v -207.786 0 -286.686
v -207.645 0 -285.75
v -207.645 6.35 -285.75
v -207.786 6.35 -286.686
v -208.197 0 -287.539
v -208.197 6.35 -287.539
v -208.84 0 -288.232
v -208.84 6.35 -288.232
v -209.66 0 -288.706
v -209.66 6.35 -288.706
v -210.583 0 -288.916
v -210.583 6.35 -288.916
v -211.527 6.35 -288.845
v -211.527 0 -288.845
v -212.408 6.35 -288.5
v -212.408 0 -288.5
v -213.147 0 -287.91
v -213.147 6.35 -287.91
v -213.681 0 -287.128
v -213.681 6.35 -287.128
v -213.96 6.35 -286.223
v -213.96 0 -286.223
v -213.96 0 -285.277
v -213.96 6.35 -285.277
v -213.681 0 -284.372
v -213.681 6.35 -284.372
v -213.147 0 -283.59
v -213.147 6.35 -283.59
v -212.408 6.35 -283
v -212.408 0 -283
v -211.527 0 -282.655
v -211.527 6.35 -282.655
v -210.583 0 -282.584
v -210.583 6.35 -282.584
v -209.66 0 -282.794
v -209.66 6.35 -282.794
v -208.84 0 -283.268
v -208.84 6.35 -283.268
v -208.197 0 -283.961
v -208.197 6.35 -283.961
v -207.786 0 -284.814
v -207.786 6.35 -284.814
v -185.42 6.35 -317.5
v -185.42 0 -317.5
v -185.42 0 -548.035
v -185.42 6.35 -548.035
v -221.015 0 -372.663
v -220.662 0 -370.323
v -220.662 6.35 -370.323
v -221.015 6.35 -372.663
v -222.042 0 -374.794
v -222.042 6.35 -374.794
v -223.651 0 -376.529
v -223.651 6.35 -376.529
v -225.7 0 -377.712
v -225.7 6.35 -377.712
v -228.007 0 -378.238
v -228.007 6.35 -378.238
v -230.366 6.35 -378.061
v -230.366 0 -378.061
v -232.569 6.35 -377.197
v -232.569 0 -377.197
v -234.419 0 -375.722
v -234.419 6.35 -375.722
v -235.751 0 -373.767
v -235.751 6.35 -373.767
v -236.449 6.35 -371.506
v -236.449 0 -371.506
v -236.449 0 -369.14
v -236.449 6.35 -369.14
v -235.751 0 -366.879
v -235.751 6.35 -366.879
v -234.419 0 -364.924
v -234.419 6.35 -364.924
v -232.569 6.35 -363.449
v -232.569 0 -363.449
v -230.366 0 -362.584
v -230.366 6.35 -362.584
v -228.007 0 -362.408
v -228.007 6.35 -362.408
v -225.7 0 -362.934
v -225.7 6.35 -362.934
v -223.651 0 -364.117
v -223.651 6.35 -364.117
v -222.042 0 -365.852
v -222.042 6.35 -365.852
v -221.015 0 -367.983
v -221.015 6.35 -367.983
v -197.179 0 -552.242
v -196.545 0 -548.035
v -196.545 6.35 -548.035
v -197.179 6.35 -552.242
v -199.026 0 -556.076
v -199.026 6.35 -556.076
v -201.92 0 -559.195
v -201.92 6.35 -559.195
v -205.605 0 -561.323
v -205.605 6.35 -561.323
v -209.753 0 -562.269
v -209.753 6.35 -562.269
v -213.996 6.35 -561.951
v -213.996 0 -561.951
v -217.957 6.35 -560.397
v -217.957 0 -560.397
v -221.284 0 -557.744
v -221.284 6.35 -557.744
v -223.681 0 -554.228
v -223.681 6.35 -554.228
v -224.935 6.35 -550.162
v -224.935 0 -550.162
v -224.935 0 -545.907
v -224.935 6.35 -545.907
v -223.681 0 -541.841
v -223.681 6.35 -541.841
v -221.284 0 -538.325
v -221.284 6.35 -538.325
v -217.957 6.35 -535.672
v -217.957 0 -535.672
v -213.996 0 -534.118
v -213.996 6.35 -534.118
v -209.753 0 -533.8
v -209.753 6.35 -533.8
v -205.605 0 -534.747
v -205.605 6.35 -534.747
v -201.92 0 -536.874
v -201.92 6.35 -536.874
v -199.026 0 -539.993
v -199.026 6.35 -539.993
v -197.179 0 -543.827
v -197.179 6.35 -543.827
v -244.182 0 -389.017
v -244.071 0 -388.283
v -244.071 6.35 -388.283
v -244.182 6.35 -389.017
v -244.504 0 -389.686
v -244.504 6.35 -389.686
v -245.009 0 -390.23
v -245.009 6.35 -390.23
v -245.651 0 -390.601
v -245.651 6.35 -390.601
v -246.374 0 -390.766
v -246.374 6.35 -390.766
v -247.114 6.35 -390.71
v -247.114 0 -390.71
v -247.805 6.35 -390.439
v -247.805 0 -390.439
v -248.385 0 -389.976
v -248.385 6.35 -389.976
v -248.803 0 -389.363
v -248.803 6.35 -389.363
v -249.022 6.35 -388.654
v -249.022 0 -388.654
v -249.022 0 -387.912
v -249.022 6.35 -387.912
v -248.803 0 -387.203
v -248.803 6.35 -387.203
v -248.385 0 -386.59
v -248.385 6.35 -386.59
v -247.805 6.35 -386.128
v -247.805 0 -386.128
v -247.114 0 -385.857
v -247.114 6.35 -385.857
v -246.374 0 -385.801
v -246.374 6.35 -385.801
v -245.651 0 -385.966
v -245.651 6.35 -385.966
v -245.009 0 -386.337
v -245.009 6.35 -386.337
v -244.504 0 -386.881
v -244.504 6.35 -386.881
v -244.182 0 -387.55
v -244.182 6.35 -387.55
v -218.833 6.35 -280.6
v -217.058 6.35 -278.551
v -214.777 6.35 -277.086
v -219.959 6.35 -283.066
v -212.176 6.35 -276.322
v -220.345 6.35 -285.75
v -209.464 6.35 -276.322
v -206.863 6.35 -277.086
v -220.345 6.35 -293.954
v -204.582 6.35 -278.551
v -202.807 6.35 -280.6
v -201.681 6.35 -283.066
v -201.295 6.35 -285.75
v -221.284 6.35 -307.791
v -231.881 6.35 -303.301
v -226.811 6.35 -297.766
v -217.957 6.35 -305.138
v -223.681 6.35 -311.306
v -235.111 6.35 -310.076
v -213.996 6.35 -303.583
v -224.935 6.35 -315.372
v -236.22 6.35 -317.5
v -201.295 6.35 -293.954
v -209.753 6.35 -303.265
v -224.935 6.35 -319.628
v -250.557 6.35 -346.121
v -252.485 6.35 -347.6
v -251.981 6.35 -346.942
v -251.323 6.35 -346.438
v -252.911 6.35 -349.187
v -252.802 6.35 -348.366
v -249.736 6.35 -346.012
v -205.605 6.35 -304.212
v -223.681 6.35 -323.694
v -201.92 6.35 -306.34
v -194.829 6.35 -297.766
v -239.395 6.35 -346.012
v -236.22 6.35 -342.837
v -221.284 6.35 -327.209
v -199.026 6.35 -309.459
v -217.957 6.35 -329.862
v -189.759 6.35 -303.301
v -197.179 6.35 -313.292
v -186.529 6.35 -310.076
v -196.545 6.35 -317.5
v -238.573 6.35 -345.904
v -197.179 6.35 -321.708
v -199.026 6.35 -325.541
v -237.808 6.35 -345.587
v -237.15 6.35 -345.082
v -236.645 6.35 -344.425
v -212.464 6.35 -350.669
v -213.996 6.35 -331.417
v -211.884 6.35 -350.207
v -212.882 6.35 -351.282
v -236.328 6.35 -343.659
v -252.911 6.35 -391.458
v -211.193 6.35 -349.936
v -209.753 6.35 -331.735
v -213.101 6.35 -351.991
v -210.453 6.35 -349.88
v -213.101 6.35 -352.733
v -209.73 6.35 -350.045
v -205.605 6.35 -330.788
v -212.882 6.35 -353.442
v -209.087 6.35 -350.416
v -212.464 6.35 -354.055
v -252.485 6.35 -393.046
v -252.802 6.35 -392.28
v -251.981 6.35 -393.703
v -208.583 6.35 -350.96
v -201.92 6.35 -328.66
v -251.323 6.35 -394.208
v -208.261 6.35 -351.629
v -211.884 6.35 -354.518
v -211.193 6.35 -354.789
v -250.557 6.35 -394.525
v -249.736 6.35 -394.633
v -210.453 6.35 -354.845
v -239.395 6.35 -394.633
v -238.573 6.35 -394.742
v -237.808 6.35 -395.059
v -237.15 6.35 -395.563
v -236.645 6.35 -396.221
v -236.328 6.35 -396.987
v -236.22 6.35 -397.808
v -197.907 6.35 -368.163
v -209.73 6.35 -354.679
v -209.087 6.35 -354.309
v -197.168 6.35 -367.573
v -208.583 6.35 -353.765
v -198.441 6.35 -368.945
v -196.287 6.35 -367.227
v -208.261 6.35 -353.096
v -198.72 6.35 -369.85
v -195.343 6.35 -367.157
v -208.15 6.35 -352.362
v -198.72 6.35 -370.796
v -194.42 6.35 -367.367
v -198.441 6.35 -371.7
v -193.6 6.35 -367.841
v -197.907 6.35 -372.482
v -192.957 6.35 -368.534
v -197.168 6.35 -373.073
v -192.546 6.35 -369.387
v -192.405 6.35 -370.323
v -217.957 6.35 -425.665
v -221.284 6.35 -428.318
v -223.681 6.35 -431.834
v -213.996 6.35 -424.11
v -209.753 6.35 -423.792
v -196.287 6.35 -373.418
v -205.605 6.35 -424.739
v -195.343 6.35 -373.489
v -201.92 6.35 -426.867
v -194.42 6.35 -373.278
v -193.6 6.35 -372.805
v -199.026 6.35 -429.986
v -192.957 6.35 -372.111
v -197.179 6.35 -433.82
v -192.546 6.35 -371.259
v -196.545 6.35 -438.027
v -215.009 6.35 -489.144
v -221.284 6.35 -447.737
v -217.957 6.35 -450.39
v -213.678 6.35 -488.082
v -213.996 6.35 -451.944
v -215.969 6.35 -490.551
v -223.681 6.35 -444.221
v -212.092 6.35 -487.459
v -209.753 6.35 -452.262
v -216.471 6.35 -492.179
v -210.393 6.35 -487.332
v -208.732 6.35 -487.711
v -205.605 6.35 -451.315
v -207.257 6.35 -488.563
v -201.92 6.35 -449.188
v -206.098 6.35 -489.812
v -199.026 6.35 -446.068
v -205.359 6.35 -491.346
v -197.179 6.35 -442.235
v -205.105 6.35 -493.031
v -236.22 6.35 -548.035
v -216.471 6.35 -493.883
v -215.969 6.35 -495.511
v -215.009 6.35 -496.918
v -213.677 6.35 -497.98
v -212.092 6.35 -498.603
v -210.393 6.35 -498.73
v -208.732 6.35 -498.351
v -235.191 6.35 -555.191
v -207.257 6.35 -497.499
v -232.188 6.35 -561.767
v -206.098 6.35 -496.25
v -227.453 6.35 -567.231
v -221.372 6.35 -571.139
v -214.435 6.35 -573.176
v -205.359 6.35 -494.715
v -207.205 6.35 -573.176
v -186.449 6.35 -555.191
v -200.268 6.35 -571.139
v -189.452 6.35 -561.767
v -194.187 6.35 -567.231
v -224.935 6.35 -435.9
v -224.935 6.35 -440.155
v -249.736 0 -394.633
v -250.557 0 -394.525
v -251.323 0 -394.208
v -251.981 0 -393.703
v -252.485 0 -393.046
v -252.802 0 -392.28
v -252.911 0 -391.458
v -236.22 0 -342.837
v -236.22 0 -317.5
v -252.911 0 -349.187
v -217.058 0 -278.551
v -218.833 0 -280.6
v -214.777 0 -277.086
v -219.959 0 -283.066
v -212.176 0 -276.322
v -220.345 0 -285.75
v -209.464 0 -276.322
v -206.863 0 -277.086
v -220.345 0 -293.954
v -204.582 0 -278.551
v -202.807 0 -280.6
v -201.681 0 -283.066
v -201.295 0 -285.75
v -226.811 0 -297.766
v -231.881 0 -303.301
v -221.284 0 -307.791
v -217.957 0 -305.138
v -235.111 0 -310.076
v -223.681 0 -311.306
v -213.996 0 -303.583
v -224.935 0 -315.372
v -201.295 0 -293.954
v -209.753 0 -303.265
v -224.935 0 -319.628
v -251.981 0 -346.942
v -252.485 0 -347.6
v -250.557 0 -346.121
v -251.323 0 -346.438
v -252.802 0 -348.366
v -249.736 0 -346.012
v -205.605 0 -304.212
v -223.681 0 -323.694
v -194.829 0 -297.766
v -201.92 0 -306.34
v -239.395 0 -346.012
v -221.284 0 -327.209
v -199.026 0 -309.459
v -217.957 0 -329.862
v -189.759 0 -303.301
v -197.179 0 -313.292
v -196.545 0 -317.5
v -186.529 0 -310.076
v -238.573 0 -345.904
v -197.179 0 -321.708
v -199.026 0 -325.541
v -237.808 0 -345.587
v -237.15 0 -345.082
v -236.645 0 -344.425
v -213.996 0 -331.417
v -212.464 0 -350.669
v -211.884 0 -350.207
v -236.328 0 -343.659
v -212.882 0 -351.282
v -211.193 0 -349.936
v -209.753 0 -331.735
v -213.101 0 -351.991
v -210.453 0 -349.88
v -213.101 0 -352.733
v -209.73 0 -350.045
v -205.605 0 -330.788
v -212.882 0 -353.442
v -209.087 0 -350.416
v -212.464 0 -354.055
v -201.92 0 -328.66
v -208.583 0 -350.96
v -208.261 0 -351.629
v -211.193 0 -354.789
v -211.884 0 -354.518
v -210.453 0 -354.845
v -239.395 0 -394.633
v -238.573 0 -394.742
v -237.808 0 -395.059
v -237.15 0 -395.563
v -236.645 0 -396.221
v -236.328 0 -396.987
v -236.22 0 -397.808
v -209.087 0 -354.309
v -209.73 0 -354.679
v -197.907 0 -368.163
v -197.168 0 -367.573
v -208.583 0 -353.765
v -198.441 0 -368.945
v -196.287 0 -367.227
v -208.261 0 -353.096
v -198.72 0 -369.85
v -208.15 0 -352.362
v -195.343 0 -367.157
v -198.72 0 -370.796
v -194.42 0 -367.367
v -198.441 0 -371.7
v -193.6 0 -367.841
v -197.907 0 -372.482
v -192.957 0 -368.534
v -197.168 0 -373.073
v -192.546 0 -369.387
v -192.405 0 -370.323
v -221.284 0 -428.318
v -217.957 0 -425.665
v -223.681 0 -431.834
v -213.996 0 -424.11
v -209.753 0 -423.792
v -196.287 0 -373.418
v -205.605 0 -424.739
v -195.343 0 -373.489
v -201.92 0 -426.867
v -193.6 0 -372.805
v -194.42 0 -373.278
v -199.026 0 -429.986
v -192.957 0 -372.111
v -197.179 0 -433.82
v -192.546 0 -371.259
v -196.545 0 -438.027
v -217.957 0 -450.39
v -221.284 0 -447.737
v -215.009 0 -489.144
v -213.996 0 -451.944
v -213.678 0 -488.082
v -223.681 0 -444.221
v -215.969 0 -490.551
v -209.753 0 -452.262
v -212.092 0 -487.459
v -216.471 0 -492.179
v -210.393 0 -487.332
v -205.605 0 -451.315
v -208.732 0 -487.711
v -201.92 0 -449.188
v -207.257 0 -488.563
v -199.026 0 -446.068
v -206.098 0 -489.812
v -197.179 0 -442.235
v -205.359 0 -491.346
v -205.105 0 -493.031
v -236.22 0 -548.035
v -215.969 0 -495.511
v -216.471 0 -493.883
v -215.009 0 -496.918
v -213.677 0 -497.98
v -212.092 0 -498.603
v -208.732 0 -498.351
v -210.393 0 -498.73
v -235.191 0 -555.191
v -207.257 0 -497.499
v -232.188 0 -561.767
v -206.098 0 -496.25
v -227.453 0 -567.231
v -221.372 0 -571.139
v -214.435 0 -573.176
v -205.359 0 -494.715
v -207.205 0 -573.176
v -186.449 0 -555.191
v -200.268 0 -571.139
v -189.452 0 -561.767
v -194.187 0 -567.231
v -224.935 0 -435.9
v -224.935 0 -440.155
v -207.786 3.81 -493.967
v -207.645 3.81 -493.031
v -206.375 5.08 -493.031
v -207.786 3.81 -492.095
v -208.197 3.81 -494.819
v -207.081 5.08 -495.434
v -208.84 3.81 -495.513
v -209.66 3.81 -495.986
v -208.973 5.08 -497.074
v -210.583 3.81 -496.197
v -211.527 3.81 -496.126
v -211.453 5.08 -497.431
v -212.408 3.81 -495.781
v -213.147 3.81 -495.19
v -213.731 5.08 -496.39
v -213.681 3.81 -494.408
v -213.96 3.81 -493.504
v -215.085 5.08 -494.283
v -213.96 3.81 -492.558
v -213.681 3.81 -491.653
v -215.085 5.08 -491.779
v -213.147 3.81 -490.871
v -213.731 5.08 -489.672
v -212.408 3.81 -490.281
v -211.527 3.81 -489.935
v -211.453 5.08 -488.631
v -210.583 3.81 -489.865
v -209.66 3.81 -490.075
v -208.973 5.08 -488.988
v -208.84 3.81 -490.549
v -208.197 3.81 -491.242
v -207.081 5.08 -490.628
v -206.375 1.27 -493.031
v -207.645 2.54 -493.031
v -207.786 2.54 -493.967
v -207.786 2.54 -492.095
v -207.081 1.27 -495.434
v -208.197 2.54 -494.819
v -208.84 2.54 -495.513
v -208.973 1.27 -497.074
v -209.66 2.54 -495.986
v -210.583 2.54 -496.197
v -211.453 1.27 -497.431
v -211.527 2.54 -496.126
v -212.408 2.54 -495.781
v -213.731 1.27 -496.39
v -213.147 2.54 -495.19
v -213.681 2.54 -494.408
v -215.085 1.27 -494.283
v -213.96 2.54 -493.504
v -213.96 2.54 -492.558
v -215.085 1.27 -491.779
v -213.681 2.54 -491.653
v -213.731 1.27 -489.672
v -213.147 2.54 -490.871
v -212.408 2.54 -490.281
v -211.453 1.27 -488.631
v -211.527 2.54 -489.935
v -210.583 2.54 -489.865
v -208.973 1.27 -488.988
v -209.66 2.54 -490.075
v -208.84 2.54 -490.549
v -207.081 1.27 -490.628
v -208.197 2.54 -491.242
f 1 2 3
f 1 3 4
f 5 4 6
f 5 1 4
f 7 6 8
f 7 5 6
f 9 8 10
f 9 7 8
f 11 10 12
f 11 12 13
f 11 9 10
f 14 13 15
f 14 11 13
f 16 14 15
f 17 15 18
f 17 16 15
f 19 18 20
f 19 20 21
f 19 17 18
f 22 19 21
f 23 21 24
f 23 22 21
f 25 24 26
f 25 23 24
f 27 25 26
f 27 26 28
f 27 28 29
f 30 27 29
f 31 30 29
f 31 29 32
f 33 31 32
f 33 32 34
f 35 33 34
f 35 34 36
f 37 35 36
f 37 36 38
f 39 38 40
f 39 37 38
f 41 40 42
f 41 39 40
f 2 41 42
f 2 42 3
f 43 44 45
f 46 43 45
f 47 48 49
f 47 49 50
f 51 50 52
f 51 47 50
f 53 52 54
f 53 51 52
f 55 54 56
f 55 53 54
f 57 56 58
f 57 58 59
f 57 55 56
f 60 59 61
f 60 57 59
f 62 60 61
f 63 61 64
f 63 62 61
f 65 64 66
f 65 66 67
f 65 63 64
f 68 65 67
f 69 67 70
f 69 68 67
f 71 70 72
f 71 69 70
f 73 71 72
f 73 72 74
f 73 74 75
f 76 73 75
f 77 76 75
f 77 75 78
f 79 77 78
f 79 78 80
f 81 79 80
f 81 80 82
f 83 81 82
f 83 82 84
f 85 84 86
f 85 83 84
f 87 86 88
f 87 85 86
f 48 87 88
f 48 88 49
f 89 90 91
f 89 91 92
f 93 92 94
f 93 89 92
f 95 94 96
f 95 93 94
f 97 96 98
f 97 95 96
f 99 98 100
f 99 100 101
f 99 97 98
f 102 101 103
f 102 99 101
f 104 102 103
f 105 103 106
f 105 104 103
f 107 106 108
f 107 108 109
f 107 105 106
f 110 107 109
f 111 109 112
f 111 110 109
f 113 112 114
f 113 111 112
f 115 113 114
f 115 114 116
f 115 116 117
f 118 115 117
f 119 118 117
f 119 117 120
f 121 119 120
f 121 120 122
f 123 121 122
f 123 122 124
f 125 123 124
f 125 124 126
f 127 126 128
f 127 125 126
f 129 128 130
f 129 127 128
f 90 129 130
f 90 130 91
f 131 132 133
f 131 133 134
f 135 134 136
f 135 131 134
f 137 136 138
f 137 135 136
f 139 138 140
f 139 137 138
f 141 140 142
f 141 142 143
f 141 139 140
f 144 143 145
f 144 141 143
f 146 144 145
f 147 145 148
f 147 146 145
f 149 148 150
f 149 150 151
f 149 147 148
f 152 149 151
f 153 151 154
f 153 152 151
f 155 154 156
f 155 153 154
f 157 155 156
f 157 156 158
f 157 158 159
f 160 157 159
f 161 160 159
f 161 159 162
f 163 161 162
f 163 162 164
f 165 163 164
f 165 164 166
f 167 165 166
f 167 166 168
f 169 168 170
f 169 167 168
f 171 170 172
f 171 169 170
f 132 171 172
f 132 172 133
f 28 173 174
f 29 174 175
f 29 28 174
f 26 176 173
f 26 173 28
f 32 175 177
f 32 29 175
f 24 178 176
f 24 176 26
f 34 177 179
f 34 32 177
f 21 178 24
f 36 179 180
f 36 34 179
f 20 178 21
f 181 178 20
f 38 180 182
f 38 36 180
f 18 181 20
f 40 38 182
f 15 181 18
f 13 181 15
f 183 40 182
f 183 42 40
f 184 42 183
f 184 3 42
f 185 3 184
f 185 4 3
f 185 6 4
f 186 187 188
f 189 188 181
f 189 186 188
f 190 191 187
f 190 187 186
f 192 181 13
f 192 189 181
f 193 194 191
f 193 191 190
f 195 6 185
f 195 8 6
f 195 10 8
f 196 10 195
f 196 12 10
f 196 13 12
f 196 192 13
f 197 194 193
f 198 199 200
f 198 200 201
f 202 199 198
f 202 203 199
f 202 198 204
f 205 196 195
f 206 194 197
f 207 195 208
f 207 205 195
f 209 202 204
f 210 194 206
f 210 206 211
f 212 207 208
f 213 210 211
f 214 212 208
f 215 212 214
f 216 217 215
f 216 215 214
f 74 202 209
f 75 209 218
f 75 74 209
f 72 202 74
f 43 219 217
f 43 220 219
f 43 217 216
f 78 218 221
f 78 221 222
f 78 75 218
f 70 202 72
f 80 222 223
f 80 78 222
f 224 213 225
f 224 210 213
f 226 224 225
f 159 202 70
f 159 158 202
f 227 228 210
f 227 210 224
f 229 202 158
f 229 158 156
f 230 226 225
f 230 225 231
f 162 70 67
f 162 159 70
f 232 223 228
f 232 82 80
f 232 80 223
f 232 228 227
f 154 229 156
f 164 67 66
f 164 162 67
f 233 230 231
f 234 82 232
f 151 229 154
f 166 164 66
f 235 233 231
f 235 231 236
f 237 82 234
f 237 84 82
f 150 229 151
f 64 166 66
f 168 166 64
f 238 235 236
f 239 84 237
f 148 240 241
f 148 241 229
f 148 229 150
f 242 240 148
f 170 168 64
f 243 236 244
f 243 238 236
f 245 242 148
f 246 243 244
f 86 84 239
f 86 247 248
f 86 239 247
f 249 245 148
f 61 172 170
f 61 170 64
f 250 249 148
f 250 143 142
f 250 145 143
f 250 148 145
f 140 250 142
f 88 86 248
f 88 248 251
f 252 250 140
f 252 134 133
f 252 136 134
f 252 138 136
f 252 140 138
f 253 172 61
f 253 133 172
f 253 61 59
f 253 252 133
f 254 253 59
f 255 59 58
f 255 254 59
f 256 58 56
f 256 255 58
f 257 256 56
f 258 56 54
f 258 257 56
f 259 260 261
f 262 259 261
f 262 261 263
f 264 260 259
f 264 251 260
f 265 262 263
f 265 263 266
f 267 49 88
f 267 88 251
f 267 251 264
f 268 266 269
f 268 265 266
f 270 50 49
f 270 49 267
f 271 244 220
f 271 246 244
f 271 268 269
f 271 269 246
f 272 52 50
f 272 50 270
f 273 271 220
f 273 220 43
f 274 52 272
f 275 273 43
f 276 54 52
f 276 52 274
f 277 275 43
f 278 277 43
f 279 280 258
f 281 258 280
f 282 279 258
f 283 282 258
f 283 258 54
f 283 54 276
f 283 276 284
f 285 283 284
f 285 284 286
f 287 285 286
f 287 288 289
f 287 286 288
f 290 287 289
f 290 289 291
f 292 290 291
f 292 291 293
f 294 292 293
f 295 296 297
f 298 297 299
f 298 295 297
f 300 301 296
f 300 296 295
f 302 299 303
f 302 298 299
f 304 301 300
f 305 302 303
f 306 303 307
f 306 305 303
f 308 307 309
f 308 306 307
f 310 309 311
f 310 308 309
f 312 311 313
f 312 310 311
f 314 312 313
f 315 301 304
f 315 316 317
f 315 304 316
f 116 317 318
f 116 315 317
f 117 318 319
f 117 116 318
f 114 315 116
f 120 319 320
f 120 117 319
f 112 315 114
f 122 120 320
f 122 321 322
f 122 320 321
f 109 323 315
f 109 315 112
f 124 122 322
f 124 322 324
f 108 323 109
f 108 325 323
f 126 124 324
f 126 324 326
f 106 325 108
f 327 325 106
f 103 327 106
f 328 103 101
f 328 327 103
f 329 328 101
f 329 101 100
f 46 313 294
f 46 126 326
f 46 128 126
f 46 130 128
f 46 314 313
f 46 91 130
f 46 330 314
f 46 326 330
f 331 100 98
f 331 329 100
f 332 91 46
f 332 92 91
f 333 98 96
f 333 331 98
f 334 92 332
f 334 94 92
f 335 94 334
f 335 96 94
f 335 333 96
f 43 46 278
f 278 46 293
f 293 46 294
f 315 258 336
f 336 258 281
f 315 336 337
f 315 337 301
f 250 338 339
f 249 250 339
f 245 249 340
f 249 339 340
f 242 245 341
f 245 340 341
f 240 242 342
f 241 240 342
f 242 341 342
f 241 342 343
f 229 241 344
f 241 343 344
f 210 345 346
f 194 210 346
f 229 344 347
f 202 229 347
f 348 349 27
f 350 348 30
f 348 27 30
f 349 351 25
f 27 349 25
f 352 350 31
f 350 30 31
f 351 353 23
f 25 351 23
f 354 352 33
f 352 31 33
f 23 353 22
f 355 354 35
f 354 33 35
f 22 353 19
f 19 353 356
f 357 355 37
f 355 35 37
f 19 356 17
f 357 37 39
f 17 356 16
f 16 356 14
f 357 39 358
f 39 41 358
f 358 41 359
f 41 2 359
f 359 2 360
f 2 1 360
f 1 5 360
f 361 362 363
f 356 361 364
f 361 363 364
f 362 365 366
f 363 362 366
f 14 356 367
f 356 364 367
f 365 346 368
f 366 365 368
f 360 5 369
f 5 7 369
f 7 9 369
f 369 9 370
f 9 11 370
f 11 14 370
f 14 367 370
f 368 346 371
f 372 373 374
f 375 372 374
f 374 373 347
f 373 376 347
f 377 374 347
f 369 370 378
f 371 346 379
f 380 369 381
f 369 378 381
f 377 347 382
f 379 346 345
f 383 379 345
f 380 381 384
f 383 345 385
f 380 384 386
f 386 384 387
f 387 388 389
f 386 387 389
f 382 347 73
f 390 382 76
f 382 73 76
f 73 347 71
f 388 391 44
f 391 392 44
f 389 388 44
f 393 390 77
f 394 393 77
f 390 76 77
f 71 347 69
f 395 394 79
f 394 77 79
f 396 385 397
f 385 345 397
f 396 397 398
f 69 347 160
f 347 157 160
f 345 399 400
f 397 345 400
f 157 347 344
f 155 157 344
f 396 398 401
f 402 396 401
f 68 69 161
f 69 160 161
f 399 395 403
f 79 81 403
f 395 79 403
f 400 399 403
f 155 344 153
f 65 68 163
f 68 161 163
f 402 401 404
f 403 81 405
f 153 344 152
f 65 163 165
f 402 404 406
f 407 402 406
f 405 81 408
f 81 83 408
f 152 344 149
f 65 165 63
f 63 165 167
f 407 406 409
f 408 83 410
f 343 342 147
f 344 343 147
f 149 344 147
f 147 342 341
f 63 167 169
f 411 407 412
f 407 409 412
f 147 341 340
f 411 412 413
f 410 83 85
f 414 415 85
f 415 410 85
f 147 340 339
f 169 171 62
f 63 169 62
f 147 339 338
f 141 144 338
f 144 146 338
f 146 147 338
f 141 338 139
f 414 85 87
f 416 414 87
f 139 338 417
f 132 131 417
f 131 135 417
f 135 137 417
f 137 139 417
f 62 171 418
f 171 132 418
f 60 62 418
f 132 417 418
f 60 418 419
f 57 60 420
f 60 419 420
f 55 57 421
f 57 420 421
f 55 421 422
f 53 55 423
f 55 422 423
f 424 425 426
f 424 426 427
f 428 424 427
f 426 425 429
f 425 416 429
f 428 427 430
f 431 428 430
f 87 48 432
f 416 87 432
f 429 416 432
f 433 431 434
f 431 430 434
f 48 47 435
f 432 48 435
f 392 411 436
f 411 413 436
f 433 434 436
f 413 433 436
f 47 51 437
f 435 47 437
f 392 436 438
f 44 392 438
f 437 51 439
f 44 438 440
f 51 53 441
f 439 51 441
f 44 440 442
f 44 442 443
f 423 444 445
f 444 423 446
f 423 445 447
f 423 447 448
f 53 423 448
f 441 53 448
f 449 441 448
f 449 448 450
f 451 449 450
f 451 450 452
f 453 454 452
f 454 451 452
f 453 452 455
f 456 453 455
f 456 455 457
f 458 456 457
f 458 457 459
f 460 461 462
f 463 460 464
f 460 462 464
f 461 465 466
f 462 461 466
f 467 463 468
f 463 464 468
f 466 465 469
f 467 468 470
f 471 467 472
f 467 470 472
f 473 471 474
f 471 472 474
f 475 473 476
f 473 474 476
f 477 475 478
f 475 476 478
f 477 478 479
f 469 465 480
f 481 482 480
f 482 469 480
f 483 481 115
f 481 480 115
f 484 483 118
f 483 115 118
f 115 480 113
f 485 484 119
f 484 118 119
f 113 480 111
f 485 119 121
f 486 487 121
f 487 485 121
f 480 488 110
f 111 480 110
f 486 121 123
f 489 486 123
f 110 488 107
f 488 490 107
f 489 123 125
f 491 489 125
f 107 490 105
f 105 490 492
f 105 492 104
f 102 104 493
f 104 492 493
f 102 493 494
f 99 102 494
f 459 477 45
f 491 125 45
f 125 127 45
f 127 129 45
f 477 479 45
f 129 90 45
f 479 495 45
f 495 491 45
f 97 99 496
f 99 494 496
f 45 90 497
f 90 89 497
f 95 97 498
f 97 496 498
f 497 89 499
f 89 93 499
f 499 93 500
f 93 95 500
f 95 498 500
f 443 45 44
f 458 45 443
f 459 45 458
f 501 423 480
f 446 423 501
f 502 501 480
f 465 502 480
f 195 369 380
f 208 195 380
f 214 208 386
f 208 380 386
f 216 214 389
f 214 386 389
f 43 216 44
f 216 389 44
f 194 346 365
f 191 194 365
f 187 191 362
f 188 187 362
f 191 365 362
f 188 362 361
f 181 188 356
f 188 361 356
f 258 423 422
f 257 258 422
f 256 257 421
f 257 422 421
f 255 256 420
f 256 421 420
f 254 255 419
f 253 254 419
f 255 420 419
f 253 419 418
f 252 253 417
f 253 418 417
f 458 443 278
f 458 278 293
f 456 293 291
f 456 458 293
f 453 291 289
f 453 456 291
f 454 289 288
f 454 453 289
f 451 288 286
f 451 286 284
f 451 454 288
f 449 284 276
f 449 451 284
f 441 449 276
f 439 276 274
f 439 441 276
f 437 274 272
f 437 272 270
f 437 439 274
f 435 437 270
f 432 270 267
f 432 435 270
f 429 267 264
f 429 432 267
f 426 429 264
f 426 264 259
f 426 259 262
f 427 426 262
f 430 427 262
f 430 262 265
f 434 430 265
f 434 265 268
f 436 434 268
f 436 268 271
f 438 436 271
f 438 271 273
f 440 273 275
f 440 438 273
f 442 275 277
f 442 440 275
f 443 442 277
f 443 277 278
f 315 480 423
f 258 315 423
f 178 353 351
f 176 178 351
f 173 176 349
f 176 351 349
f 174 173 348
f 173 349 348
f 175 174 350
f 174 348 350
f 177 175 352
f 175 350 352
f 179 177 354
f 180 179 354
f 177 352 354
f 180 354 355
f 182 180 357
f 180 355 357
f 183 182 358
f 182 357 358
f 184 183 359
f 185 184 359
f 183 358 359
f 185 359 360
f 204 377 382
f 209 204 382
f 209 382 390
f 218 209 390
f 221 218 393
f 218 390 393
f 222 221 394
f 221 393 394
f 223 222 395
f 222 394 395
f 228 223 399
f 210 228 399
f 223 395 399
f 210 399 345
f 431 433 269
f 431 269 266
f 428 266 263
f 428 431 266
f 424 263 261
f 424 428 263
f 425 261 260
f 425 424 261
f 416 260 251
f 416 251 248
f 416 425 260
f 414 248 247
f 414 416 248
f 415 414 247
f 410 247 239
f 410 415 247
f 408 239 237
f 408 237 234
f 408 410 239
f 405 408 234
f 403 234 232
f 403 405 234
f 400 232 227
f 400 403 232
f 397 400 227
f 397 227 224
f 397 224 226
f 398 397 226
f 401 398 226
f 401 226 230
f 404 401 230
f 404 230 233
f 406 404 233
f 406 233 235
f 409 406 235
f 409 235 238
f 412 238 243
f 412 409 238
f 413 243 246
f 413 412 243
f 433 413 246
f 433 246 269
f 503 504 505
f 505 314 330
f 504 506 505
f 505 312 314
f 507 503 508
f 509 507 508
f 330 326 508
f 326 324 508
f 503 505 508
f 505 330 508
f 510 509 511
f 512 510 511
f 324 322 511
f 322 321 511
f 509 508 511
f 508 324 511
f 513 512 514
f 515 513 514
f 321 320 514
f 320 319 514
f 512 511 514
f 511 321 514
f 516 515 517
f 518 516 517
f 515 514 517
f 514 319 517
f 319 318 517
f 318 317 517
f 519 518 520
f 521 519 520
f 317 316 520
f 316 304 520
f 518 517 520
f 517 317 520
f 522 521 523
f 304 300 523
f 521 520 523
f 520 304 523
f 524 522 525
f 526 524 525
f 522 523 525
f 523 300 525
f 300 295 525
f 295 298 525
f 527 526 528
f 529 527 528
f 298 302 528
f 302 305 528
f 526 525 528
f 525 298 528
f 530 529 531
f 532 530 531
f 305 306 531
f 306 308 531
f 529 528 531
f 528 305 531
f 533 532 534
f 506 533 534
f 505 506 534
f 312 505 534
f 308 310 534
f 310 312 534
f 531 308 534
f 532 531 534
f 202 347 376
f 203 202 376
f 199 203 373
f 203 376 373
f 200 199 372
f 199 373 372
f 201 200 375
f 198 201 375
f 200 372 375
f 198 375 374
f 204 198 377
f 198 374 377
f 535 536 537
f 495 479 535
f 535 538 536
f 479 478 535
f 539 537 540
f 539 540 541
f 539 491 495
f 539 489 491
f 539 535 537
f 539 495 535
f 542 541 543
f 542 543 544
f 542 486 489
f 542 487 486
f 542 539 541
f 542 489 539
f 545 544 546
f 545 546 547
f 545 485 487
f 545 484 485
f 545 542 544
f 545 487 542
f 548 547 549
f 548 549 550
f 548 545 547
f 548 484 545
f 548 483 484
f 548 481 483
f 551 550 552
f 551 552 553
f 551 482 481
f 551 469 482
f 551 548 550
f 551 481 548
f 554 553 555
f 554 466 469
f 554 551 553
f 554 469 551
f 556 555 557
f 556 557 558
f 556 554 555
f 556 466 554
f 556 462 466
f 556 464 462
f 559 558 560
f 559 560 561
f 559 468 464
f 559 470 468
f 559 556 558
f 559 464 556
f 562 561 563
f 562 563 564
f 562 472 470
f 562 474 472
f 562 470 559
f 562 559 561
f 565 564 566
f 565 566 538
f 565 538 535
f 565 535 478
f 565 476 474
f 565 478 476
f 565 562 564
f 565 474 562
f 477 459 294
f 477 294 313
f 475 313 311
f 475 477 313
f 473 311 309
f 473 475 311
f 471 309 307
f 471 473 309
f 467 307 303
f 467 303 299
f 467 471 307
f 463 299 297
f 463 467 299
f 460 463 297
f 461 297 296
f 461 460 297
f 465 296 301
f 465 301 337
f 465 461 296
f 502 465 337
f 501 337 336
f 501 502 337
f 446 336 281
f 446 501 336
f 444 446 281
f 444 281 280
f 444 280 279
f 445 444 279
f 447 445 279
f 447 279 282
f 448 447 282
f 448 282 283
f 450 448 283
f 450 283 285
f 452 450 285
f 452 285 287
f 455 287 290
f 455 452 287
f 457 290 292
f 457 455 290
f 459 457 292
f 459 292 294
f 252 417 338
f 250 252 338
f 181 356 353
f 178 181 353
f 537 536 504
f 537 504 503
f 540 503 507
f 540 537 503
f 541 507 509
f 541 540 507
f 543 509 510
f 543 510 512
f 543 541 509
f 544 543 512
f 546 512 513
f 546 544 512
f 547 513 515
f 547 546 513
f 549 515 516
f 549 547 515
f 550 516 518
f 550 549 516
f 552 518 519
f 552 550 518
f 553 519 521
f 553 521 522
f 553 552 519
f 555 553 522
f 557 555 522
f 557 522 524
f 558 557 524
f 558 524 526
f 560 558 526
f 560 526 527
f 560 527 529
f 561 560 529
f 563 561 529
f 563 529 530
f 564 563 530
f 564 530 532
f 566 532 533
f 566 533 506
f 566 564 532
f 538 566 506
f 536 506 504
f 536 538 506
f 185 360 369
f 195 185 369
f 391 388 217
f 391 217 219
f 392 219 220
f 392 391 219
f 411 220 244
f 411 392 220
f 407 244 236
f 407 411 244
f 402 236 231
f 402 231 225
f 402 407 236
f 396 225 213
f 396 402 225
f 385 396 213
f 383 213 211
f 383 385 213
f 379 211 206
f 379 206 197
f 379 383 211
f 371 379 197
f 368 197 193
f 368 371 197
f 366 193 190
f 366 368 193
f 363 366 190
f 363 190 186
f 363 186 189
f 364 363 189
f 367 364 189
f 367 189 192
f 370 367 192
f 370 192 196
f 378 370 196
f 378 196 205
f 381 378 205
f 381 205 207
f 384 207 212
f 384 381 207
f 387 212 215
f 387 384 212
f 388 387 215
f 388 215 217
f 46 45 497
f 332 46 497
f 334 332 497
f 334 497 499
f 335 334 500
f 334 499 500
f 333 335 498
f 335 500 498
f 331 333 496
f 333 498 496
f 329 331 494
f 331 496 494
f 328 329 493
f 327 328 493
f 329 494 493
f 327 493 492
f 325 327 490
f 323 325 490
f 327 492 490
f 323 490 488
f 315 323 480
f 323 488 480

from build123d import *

# Parameters (mm, degrees)
SKETCH3_R           = 14.2748
SKETCH3_R_2         = 7.9375
SKETCH3_R_3         = 2.4892
SKETCH3_R_4         = 3.175
BOSS_EXTRUDE1_DEPTH = 6.35
CHAMFER1_SIZE       = 2.54


with BuildPart() as part:
    # Sketch3 → Boss-Extrude1 (new body)
    with BuildSketch(Plane(origin=(0, 0, 0), x_dir=(1, 0, 0), z_dir=(0, 1, 0))):
        with BuildLine():
            Line((-249.735512242, 346.01236887), (-239.395, 346.01236887))
            ThreePointArc((-239.395, 346.01236887), (-237.14993597, 345.0824329), (-236.22, 342.83736887))
            Line((-236.22, 342.83736887), (-236.22, 317.5))
            ThreePointArc((-236.22, 317.5), (-231.880567419, 303.300968343), (-220.345, 293.953569803))
            Line((-220.345, 293.953569803), (-220.345, 285.75))
            ThreePointArc((-220.345, 285.75), (-210.82, 276.225), (-201.295, 285.75))
            Line((-201.295, 285.75), (-201.295, 293.953569803))
            ThreePointArc((-201.295, 293.953569803), (-189.759432581, 303.300968343), (-185.42, 317.5))
            Line((-185.42, 317.5), (-185.42, 548.034576396))
            ThreePointArc((-185.42, 548.034576396), (-210.82, 573.434576396), (-236.22, 548.034576396))
            Line((-236.22, 548.034576396), (-236.22, 397.808393354))
            ThreePointArc((-236.22, 397.808393354), (-237.14993597, 395.563329324), (-239.395, 394.633393354))
            Line((-239.395, 394.633393354), (-249.735512242, 394.633393354))
            ThreePointArc((-249.735512242, 394.633393354), (-251.980576272, 393.703457384), (-252.910512242, 391.458393354))
            Line((-252.910512242, 391.458393354), (-252.910512242, 349.18736887))
            ThreePointArc((-252.910512242, 349.18736887), (-251.980576272, 346.942304839), (-249.735512242, 346.01236887))
        make_face()
        with Locations((-210.82, 548.034576396)):
            Circle(SKETCH3_R, mode=Mode.SUBTRACT)
        with Locations((-210.82, 438.027176396)):
            Circle(SKETCH3_R, mode=Mode.SUBTRACT)
        with Locations((-210.82, 317.5)):
            Circle(SKETCH3_R, mode=Mode.SUBTRACT)
        with Locations((-228.6, 370.322881112)):
            Circle(SKETCH3_R_2, mode=Mode.SUBTRACT)
        with Locations((-246.560512242, 388.283393354)):
            Circle(SKETCH3_R_3, mode=Mode.SUBTRACT)
        with Locations((-210.639487758, 352.36236887)):
            Circle(SKETCH3_R_3, mode=Mode.SUBTRACT)
        with Locations((-210.82, 285.75)):
            Circle(SKETCH3_R_4, mode=Mode.SUBTRACT)
        with Locations((-210.82, 493.030876396)):
            Circle(SKETCH3_R_4, mode=Mode.SUBTRACT)
        with Locations((-195.58, 370.322881112)):
            Circle(SKETCH3_R_4, mode=Mode.SUBTRACT)
    extrude(amount=BOSS_EXTRUDE1_DEPTH)

    # Chamfer1
    chamfer1_edges = [part.edges().sort_by_distance(p)[0] for p in [
        (-213.995, 6.35, -493.030876396),
        (-213.995, 0, -493.030876396),
    ]]
    chamfer(chamfer1_edges, length=CHAMFER1_SIZE)


solid = part.part
